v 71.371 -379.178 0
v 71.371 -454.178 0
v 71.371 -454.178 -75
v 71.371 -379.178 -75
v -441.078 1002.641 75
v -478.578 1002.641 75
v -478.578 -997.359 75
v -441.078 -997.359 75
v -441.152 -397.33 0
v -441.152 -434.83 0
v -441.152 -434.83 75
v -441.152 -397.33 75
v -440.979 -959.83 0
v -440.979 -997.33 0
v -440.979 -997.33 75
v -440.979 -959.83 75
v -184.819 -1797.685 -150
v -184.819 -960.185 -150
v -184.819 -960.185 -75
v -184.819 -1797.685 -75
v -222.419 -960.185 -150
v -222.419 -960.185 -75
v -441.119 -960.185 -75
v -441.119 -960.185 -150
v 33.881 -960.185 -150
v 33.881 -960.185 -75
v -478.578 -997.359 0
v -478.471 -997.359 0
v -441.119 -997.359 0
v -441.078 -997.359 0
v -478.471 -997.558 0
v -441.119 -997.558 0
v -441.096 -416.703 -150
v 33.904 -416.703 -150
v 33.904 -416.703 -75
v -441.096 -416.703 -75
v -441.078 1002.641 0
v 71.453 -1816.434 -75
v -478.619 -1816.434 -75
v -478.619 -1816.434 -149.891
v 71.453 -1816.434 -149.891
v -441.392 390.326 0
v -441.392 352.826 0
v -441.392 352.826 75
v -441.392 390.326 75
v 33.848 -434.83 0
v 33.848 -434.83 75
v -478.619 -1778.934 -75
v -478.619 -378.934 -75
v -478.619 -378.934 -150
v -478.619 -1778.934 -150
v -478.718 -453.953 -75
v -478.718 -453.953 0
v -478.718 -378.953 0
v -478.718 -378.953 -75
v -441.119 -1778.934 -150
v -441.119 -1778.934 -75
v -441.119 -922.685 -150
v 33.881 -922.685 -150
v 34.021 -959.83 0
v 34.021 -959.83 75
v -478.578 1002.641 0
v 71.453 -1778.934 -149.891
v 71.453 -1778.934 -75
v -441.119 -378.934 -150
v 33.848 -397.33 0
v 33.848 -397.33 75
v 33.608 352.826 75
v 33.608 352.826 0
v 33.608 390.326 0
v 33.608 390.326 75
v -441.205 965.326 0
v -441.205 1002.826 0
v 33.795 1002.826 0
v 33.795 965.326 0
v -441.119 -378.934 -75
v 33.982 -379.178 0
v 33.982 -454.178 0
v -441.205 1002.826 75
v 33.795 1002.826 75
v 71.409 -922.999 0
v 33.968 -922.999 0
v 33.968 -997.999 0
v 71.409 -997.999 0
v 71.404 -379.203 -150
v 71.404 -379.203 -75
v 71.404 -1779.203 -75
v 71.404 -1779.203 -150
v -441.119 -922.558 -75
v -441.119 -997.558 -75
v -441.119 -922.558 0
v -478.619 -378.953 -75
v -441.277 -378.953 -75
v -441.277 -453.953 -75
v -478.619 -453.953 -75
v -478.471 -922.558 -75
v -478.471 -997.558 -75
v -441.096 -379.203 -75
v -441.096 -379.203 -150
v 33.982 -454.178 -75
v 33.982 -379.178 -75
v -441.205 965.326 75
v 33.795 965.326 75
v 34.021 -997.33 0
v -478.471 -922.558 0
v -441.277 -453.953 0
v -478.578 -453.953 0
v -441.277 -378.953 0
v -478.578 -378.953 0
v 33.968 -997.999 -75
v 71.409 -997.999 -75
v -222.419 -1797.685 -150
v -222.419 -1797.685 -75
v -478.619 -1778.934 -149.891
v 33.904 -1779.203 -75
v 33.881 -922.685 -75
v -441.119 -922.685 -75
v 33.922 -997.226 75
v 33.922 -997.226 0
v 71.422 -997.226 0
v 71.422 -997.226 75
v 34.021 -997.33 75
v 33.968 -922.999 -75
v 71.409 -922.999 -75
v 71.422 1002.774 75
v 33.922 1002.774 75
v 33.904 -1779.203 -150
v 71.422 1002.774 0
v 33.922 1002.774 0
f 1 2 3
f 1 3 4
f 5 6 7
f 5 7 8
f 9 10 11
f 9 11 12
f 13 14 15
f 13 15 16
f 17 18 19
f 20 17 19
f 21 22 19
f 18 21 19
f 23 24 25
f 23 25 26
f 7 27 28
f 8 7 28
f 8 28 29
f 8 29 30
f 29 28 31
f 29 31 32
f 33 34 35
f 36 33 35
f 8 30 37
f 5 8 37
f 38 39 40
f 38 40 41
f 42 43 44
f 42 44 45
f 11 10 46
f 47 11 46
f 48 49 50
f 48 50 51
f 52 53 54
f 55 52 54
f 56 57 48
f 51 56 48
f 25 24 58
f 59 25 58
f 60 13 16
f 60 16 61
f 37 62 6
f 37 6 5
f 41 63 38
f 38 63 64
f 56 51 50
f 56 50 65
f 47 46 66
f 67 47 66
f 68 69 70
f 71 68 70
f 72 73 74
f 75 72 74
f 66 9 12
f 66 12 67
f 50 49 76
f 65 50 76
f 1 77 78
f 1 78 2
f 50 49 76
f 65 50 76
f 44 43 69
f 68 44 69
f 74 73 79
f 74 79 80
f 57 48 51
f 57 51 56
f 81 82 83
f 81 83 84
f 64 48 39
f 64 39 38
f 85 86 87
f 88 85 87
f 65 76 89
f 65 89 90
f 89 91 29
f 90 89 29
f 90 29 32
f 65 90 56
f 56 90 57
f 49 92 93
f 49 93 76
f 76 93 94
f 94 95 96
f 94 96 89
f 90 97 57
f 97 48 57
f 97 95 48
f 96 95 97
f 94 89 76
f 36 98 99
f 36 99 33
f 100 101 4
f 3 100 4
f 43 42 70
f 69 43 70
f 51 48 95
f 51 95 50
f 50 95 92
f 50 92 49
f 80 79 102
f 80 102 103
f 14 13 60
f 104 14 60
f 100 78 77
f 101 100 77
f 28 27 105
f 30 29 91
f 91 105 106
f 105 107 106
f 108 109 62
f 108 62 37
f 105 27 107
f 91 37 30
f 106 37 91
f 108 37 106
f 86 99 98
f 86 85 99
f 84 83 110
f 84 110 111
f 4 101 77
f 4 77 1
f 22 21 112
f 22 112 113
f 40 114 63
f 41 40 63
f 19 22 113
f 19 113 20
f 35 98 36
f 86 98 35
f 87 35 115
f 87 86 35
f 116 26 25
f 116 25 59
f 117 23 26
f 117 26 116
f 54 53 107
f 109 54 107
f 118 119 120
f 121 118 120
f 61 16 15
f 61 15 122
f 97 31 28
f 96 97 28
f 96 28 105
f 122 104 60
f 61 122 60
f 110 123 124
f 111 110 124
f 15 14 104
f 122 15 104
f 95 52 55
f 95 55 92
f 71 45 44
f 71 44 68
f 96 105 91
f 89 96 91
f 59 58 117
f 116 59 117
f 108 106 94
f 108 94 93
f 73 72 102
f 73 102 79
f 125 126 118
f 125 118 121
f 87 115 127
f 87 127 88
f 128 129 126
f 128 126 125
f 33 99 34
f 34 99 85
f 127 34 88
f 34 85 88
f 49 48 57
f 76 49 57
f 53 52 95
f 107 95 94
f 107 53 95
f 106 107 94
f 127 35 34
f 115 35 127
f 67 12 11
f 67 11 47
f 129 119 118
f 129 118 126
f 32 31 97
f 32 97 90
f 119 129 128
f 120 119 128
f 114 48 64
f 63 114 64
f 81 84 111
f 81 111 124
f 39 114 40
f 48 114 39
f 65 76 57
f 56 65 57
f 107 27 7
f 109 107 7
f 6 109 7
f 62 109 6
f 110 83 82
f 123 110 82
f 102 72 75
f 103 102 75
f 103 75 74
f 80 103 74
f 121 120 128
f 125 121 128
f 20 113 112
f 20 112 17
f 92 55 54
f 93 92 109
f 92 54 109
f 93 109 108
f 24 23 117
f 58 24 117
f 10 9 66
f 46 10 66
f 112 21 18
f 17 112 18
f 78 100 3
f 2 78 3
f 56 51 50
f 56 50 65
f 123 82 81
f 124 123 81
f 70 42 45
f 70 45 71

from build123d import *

# Parameters (mm, degrees)
F0_W      = 37.5
F0_H      = 2000
F2_DEPTH  = 75
F1_W      = 475
F1_H      = 37.5
F3_W      = 37.4414445066
F3_H      = 75
F3_W_2    = 37.3510122299
F4_DEPTH  = 75
F3_W_3    = 37.4418273568
F3_W_4    = 37.3892523348
F5_W      = 37.3510122299
F5_H      = 75
F6_DEPTH  = 75
F5_W_2    = 37.5
F5_H_2    = 1400
F7_DEPTH  = 75
F8_W      = 37.5
F8_H      = 75
F9_DEPTH  = 475
F10_W     = 550.0727504492
F10_H     = 74.8913913965
F11_DEPTH = 37.5
F12_W     = 37.5
F12_H     = 75
F13_DEPTH = 475
F14_W     = 37.6
F14_H     = 75
F15_DEPTH = 837.5


with BuildPart() as f2:
    # F0 (on Top) → F2 (new body)
    with BuildSketch(Plane.XY):
        with Locations((52.6724718511, 2.7743894607)):
            Rectangle(F0_W, F0_H)
    extrude(amount=F2_DEPTH)


with BuildPart() as f2b:
    # F0 (on Top) → F2, piece 2 (new body)
    with BuildSketch(Plane.XY):
        with Locations((-459.8275281489, 2.6409029961)):
            Rectangle(F0_W, F0_H)
    extrude(amount=F2_DEPTH)

    # F3 (on Top) → F4 (join)
    with BuildSketch(Plane.XY):
        with Locations((-459.9973857403, -416.4530932903)):
            Rectangle(F3_W, F3_H)
        with Locations((-459.7949981689, -960.0578784943)):
            Rectangle(F3_W_2, F3_H)
    extrude(amount=-F4_DEPTH)

    # F5 (on face) → F6 (join)
    with BuildSketch(Plane(origin=(0, 0, -75), x_dir=(1, 0, 0), z_dir=(0, 0, -1))):
        Polygon((-478.619492054, 1778.9342453794), (-478.619492054, 378.9342453794), (-441.119492054, 378.9342453794), (-441.119492054, 922.5578784943), (-478.4705042839, 922.5578784943), (-478.4705042839, 997.5578784943), (-441.119492054, 997.5578784943), (-441.119492054, 1778.9342453794), align=None)
        with Locations((-459.7949981689, 960.0578784943)):
            Rectangle(F5_W, F5_H)
    extrude(amount=F6_DEPTH)


with BuildPart() as f2c:
    # F1 (on Top) → F2, piece 3 (new body)
    with BuildSketch(Plane.XY):
        with Locations((-203.7048033006, 984.0755462646)):
            Rectangle(F1_W, F1_H)
    extrude(amount=F2_DEPTH)


with BuildPart() as f2d:
    # F1 (on Top) → F2, piece 4 (new body)
    with BuildSketch(Plane.XY):
        with Locations((-203.8916617632, 371.5755462646)):
            Rectangle(F1_W, F1_H)
    extrude(amount=F2_DEPTH)


with BuildPart() as f2e:
    # F1 (on Top) → F2, piece 5 (new body)
    with BuildSketch(Plane.XY):
        with Locations((-203.4793801606, -978.5795778036)):
            Rectangle(F1_W, F1_H)
    extrude(amount=F2_DEPTH)


with BuildPart() as f2f:
    # F1 (on Top) → F2, piece 6 (new body)
    with BuildSketch(Plane.XY):
        with Locations((-203.6520771682, -416.0795778036)):
            Rectangle(F1_W, F1_H)
    extrude(amount=F2_DEPTH)


with BuildPart() as f4:
    # F3 (on Top) → F4, piece 2 (new body)
    with BuildSketch(Plane.XY):
        with Locations((52.6885055006, -960.498893261)):
            Rectangle(F3_W_3, F3_H)
        with Locations((52.6766311377, -416.6781842709)):
            Rectangle(F3_W_4, F3_H)
    extrude(amount=-F4_DEPTH)


with BuildPart() as f7:
    # F5 (on face) → F7 (new body)
    with BuildSketch(Plane(origin=(0, 0, -75), x_dir=(1, 0, 0), z_dir=(0, 0, -1))):
        with Locations((-459.869492054, 1078.9342453794)):
            Rectangle(F5_W_2, F5_H_2)
    extrude(amount=F7_DEPTH)


with BuildPart() as f7b:
    # F5 (on face) → F7, piece 2 (new body)
    with BuildSketch(Plane(origin=(0, 0, -75), x_dir=(1, 0, 0), z_dir=(0, 0, -1))):
        with Locations((52.6538968086, 1079.2031109333)):
            Rectangle(F5_W_2, F5_H_2)
    extrude(amount=F7_DEPTH)

    # F8 (on face) → F9 (join)
    with BuildSketch(Plane(origin=(33.9038968086, 0, 0), x_dir=(0, -1, 0), z_dir=(-1, 0, 0))):
        with Locations((397.9531109333, -112.5)):
            Rectangle(F8_W, F8_H)
    extrude(amount=F9_DEPTH)


with BuildPart() as f11:
    # F10 (on face) → F11 (new body)
    with BuildSketch(Plane.XZ.offset(1778.9342453794)):
        with Locations((-203.5831168294, -112.4456956983)):
            Rectangle(F10_W, F10_H)
    extrude(amount=F11_DEPTH)


with BuildPart() as f13:
    # F12 (on face) → F13 (new body)
    with BuildSketch(Plane.YZ.offset(-441.119492054)):
        with Locations((-941.4346337318, -112.5)):
            Rectangle(F12_W, F12_H)
    extrude(amount=F13_DEPTH)


with BuildPart() as f15:
    # F14 (on face) → F15 (new body)
    with BuildSketch(Plane.XZ.offset(960.1846337318)):
        with Locations((-203.619492054, -112.5)):
            Rectangle(F14_W, F14_H)
    extrude(amount=F15_DEPTH)


solid = Compound([f2.part, f2b.part, f2c.part, f2d.part, f2e.part, f2f.part, f4.part, f7.part, f7b.part, f11.part, f13.part, f15.part])
